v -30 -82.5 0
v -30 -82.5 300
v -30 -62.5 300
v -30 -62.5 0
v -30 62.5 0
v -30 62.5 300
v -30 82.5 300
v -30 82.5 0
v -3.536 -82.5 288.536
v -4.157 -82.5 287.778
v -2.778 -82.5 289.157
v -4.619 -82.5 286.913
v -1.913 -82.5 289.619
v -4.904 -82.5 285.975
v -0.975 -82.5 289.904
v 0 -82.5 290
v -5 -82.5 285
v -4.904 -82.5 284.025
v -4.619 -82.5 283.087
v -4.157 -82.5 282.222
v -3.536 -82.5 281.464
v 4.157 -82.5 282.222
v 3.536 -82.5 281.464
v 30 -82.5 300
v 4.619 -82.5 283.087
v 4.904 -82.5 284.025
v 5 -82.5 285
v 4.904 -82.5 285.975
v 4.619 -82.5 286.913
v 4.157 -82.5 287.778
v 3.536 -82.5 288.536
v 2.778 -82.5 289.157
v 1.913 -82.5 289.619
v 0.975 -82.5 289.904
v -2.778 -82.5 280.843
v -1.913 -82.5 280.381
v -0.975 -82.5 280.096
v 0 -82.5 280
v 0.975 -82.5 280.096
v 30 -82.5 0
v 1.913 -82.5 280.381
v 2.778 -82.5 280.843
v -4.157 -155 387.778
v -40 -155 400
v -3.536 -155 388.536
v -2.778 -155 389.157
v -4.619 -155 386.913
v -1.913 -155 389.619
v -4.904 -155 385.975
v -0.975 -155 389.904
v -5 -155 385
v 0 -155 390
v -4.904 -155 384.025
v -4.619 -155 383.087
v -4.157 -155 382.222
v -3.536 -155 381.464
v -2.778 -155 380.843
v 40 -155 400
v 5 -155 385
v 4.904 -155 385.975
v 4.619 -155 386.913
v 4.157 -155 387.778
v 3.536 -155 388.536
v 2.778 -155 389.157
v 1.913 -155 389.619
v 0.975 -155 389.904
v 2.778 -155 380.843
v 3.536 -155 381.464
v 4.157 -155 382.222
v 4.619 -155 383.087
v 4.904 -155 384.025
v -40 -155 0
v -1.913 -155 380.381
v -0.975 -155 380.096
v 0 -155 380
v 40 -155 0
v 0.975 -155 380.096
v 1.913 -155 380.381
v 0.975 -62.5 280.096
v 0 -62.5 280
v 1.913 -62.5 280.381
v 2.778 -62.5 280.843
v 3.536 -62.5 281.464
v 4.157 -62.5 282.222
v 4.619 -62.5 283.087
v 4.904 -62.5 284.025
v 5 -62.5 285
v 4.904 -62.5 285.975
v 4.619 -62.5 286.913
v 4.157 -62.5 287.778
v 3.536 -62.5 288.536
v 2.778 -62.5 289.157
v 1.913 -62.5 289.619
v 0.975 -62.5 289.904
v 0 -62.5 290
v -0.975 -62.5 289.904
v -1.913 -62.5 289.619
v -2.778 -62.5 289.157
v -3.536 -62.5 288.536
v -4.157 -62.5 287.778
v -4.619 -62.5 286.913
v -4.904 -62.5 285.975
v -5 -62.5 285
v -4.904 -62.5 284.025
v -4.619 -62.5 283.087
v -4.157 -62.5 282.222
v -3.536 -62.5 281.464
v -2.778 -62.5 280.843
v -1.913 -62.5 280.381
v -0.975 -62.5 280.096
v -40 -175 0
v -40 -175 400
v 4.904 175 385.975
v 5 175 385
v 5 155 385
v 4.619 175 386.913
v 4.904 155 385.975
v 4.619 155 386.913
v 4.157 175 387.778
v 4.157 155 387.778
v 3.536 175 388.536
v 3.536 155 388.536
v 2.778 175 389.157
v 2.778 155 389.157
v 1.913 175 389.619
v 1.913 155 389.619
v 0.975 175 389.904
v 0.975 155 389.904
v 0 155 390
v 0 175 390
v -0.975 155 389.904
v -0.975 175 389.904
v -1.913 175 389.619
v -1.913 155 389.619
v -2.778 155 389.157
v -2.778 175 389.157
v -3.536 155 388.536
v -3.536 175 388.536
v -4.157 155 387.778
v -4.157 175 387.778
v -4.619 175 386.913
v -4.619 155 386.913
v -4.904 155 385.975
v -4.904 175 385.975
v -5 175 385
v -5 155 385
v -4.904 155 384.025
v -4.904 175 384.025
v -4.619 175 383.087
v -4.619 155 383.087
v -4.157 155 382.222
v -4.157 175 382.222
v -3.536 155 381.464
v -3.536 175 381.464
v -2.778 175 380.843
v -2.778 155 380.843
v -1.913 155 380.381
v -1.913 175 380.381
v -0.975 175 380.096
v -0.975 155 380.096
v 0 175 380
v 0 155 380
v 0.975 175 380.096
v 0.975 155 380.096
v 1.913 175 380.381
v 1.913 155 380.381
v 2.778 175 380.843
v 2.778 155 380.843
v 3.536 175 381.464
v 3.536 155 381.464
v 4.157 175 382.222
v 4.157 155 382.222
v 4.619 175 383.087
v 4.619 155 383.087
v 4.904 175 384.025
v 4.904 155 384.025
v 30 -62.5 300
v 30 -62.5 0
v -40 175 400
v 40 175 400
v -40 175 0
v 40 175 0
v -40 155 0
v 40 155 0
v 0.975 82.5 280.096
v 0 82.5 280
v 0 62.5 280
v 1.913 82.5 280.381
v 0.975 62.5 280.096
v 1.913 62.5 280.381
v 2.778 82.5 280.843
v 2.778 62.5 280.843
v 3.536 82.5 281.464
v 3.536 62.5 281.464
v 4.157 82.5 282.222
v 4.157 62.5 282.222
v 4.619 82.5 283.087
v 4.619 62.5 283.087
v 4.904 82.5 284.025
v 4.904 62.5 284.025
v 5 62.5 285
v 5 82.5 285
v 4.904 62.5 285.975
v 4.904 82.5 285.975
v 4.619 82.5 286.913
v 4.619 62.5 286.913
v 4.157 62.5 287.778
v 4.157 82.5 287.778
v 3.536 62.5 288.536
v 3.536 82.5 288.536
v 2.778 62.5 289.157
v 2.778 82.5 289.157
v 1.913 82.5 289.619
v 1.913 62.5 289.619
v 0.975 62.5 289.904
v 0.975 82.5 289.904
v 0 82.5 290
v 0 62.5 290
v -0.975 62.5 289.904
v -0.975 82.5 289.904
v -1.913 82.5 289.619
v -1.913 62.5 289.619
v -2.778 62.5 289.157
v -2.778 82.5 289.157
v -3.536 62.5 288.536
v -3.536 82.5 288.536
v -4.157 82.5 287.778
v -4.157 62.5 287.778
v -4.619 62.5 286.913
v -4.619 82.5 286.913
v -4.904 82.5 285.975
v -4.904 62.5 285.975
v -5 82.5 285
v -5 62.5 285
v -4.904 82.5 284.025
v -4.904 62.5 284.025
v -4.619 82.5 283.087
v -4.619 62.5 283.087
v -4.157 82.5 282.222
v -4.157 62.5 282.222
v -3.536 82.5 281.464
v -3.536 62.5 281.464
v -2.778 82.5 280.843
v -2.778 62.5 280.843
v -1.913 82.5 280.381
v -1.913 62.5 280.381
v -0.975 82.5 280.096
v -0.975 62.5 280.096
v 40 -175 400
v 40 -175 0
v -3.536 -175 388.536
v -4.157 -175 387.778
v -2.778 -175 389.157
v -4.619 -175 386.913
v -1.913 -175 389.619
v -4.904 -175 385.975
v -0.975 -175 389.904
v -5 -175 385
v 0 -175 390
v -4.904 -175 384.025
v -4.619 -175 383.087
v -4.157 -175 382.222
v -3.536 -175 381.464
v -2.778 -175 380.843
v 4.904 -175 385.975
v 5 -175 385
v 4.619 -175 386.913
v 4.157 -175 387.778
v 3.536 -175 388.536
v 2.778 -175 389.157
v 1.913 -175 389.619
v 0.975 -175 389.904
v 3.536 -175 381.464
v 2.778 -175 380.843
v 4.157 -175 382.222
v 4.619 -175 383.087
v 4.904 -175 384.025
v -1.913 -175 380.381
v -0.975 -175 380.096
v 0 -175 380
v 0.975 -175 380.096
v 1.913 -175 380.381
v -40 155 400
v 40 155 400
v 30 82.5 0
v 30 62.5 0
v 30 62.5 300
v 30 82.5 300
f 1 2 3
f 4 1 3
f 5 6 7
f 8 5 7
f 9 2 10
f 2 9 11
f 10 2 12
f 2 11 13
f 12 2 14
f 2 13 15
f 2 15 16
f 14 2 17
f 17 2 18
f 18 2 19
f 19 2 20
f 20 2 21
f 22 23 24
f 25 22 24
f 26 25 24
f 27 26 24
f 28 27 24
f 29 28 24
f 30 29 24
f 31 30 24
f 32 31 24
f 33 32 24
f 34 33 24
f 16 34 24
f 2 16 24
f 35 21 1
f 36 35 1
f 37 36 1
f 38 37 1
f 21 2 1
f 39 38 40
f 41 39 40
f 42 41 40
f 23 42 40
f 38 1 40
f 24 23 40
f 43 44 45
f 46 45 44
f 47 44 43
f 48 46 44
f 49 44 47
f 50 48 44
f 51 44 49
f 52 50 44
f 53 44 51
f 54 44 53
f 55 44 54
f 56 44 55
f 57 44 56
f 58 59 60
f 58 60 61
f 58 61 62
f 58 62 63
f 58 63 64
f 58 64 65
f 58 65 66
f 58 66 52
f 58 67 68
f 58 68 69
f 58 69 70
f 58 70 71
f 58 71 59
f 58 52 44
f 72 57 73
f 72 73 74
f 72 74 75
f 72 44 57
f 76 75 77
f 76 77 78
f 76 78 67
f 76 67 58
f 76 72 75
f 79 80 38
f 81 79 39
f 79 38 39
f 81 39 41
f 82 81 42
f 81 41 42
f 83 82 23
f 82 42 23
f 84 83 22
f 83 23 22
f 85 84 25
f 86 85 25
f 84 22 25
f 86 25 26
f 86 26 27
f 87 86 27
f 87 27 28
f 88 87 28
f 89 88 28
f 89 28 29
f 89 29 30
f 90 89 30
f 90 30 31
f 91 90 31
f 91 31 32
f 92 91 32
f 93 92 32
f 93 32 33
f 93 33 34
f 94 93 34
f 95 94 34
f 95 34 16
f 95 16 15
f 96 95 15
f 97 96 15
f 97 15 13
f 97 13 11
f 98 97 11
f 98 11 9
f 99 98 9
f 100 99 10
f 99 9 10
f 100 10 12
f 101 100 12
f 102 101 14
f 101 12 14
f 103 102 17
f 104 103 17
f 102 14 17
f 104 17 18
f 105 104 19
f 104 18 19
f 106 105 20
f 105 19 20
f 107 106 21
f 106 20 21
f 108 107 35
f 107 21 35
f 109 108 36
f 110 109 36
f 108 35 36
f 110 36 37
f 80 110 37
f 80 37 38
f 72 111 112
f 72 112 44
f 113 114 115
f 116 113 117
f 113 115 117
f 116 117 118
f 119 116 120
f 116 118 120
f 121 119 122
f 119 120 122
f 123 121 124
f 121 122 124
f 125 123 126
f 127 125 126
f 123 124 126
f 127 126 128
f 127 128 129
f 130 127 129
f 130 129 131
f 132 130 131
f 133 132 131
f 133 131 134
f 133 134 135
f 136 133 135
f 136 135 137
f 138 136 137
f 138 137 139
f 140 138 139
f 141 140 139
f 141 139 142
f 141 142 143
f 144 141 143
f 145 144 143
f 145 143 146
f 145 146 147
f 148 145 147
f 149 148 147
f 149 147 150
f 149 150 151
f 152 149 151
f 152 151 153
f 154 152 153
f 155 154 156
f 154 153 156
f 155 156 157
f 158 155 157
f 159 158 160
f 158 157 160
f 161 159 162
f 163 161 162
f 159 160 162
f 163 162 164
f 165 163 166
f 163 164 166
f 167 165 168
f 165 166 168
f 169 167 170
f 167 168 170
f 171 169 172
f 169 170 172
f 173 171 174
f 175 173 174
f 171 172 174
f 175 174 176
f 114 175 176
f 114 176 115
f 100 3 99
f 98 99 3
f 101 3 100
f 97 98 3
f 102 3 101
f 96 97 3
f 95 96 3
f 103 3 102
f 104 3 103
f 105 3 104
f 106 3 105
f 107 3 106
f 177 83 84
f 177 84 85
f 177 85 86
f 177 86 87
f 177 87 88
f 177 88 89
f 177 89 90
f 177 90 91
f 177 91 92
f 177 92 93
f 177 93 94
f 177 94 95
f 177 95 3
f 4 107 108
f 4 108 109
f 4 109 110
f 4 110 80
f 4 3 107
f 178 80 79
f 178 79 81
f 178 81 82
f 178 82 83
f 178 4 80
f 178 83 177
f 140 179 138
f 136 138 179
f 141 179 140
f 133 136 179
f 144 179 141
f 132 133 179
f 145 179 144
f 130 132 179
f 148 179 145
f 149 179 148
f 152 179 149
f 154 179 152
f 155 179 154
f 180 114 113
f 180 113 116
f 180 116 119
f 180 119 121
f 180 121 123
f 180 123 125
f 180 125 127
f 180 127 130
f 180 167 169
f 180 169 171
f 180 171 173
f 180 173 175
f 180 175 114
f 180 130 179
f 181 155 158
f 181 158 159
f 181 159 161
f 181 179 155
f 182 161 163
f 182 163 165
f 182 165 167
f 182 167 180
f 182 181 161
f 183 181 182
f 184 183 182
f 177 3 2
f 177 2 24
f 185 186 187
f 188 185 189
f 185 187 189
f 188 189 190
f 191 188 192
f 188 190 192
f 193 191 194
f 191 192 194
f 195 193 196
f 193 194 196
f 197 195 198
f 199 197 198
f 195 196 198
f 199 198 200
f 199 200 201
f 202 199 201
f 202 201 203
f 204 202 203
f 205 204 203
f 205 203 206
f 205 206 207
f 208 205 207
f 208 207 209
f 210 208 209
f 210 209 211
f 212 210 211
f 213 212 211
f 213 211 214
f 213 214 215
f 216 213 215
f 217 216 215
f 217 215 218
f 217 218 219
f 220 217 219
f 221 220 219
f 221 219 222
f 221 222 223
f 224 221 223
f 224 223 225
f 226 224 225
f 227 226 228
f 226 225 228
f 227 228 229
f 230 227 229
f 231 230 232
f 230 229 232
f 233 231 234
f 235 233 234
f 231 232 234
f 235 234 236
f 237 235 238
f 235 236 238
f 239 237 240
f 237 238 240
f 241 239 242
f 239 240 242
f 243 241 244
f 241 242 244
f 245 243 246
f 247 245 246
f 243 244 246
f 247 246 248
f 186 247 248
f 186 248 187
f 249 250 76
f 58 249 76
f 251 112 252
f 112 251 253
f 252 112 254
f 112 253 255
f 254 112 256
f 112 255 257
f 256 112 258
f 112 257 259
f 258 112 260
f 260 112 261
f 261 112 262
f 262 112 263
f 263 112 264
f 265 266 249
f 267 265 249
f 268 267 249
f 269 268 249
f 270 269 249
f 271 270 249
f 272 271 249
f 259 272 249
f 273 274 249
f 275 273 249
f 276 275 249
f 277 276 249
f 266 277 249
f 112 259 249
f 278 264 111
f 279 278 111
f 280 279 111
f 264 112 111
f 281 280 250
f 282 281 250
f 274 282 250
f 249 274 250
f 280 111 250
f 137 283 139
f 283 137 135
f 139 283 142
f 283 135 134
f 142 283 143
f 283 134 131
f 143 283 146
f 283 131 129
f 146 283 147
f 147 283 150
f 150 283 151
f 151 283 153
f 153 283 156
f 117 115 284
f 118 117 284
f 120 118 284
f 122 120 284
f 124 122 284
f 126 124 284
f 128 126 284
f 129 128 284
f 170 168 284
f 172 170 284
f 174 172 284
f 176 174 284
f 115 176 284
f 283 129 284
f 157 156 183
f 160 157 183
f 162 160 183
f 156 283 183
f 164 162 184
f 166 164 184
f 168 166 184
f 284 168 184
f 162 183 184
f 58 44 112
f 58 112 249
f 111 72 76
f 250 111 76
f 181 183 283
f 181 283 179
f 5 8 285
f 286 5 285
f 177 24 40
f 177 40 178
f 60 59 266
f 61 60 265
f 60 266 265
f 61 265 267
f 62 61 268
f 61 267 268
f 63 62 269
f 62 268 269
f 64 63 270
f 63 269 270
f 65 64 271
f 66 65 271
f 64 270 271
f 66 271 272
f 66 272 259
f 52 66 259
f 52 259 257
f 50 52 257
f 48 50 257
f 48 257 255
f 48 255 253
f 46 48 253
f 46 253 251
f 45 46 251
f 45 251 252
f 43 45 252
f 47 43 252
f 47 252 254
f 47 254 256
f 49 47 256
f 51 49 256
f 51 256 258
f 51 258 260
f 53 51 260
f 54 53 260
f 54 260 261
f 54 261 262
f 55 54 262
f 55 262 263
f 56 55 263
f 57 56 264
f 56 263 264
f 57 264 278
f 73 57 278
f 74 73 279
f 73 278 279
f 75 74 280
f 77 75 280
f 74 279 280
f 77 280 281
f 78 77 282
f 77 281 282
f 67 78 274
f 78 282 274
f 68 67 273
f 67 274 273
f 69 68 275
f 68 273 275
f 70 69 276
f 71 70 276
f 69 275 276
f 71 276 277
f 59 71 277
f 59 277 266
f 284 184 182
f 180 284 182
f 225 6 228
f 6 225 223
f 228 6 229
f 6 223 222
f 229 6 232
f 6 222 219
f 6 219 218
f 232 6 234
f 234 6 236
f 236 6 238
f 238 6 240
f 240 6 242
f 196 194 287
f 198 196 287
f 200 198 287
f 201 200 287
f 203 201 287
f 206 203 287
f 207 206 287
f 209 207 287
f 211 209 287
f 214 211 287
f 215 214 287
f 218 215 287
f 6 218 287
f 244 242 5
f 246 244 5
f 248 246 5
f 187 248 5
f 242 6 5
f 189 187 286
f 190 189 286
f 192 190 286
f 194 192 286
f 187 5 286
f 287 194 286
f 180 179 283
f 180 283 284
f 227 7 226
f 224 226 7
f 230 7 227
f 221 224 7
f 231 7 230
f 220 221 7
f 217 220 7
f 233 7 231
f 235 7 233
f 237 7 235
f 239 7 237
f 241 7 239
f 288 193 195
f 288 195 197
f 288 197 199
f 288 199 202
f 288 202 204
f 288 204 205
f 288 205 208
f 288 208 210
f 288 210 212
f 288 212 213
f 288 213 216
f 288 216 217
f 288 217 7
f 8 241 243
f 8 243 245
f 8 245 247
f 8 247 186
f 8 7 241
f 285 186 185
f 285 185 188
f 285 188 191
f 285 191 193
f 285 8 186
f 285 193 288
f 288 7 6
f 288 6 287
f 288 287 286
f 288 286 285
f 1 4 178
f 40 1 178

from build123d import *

# Parameters (mm, degrees)
SKETCH_1_W          = 80
SKETCH_1_H          = 20
EXTRUDE_1_DEPTH     = 400
EXTRUDE_1_2_DEPTH   = 400
SKETCH_3_R          = 5
CUT_EXTRUDE_1_DEPTH = 400
SKETCH_4_W          = 60
SKETCH_4_H          = 20
EXTRUDE_2_DEPTH     = 300
EXTRUDE_2_2_DEPTH   = 300
SKETCH_5_R          = 5
CUT_EXTRUDE_2_DEPTH = 300


with BuildPart() as part:
    # Эскиз1 → Бобышка-Вытянуть1 (new body)
    with BuildSketch(Plane.XY):
        with Locations((0, 165)):
            Rectangle(SKETCH_1_W, SKETCH_1_H)
    extrude(amount=EXTRUDE_1_DEPTH)


with BuildPart() as body_2:
    # Эскиз1 → Extrude 1 2 (new body)
    with BuildSketch(Plane.XY):
        with Locations((0, -165)):
            Rectangle(SKETCH_1_W, SKETCH_1_H)
    extrude(amount=EXTRUDE_1_2_DEPTH)


with BuildPart() as cut_extrude_1_tool:
    # Эскиз3 → Вырез-Вытянуть1 (new body)
    with BuildSketch(Plane.XZ.offset(175)):
        with Locations((0, 385)):
            Circle(SKETCH_3_R)
    extrude(amount=-CUT_EXTRUDE_1_DEPTH)


with BuildPart() as part_1:
    add(part.part)

    # Вырез-Вытянуть1: cut by cut_extrude_1_tool
    add(cut_extrude_1_tool.part, mode=Mode.SUBTRACT)


with BuildPart() as body_2_1:
    add(body_2.part)

    # Вырез-Вытянуть1: cut by cut_extrude_1_tool
    add(cut_extrude_1_tool.part, mode=Mode.SUBTRACT)


with BuildPart() as body_3:
    # Эскиз4 → Бобышка-Вытянуть2 (new body)
    with BuildSketch(Plane.XY):
        with Locations((0, -72.5)):
            Rectangle(SKETCH_4_W, SKETCH_4_H)
    extrude(amount=EXTRUDE_2_DEPTH)


with BuildPart() as body_4:
    # Эскиз4 → Extrude 2 2 (new body)
    with BuildSketch(Plane.XY):
        with Locations((0, 72.5)):
            Rectangle(SKETCH_4_W, SKETCH_4_H)
    extrude(amount=EXTRUDE_2_2_DEPTH)


with BuildPart() as cut_extrude_2_tool:
    # Эскиз5 → Вырез-Вытянуть2 (new body)
    with BuildSketch(Plane.XZ.offset(82.5)):
        with Locations(Location((0, 285, 0), (0, 0, 270))):
            Circle(SKETCH_5_R)
    extrude(amount=-CUT_EXTRUDE_2_DEPTH)


with BuildPart() as body_4_1:
    add(body_4.part)

    # Вырез-Вытянуть2: cut by cut_extrude_2_tool
    add(cut_extrude_2_tool.part, mode=Mode.SUBTRACT)


with BuildPart() as body_3_1:
    add(body_3.part)

    # Вырез-Вытянуть2: cut by cut_extrude_2_tool
    add(cut_extrude_2_tool.part, mode=Mode.SUBTRACT)


solid = Compound([part_1.part, body_2_1.part, body_4_1.part, body_3_1.part])
